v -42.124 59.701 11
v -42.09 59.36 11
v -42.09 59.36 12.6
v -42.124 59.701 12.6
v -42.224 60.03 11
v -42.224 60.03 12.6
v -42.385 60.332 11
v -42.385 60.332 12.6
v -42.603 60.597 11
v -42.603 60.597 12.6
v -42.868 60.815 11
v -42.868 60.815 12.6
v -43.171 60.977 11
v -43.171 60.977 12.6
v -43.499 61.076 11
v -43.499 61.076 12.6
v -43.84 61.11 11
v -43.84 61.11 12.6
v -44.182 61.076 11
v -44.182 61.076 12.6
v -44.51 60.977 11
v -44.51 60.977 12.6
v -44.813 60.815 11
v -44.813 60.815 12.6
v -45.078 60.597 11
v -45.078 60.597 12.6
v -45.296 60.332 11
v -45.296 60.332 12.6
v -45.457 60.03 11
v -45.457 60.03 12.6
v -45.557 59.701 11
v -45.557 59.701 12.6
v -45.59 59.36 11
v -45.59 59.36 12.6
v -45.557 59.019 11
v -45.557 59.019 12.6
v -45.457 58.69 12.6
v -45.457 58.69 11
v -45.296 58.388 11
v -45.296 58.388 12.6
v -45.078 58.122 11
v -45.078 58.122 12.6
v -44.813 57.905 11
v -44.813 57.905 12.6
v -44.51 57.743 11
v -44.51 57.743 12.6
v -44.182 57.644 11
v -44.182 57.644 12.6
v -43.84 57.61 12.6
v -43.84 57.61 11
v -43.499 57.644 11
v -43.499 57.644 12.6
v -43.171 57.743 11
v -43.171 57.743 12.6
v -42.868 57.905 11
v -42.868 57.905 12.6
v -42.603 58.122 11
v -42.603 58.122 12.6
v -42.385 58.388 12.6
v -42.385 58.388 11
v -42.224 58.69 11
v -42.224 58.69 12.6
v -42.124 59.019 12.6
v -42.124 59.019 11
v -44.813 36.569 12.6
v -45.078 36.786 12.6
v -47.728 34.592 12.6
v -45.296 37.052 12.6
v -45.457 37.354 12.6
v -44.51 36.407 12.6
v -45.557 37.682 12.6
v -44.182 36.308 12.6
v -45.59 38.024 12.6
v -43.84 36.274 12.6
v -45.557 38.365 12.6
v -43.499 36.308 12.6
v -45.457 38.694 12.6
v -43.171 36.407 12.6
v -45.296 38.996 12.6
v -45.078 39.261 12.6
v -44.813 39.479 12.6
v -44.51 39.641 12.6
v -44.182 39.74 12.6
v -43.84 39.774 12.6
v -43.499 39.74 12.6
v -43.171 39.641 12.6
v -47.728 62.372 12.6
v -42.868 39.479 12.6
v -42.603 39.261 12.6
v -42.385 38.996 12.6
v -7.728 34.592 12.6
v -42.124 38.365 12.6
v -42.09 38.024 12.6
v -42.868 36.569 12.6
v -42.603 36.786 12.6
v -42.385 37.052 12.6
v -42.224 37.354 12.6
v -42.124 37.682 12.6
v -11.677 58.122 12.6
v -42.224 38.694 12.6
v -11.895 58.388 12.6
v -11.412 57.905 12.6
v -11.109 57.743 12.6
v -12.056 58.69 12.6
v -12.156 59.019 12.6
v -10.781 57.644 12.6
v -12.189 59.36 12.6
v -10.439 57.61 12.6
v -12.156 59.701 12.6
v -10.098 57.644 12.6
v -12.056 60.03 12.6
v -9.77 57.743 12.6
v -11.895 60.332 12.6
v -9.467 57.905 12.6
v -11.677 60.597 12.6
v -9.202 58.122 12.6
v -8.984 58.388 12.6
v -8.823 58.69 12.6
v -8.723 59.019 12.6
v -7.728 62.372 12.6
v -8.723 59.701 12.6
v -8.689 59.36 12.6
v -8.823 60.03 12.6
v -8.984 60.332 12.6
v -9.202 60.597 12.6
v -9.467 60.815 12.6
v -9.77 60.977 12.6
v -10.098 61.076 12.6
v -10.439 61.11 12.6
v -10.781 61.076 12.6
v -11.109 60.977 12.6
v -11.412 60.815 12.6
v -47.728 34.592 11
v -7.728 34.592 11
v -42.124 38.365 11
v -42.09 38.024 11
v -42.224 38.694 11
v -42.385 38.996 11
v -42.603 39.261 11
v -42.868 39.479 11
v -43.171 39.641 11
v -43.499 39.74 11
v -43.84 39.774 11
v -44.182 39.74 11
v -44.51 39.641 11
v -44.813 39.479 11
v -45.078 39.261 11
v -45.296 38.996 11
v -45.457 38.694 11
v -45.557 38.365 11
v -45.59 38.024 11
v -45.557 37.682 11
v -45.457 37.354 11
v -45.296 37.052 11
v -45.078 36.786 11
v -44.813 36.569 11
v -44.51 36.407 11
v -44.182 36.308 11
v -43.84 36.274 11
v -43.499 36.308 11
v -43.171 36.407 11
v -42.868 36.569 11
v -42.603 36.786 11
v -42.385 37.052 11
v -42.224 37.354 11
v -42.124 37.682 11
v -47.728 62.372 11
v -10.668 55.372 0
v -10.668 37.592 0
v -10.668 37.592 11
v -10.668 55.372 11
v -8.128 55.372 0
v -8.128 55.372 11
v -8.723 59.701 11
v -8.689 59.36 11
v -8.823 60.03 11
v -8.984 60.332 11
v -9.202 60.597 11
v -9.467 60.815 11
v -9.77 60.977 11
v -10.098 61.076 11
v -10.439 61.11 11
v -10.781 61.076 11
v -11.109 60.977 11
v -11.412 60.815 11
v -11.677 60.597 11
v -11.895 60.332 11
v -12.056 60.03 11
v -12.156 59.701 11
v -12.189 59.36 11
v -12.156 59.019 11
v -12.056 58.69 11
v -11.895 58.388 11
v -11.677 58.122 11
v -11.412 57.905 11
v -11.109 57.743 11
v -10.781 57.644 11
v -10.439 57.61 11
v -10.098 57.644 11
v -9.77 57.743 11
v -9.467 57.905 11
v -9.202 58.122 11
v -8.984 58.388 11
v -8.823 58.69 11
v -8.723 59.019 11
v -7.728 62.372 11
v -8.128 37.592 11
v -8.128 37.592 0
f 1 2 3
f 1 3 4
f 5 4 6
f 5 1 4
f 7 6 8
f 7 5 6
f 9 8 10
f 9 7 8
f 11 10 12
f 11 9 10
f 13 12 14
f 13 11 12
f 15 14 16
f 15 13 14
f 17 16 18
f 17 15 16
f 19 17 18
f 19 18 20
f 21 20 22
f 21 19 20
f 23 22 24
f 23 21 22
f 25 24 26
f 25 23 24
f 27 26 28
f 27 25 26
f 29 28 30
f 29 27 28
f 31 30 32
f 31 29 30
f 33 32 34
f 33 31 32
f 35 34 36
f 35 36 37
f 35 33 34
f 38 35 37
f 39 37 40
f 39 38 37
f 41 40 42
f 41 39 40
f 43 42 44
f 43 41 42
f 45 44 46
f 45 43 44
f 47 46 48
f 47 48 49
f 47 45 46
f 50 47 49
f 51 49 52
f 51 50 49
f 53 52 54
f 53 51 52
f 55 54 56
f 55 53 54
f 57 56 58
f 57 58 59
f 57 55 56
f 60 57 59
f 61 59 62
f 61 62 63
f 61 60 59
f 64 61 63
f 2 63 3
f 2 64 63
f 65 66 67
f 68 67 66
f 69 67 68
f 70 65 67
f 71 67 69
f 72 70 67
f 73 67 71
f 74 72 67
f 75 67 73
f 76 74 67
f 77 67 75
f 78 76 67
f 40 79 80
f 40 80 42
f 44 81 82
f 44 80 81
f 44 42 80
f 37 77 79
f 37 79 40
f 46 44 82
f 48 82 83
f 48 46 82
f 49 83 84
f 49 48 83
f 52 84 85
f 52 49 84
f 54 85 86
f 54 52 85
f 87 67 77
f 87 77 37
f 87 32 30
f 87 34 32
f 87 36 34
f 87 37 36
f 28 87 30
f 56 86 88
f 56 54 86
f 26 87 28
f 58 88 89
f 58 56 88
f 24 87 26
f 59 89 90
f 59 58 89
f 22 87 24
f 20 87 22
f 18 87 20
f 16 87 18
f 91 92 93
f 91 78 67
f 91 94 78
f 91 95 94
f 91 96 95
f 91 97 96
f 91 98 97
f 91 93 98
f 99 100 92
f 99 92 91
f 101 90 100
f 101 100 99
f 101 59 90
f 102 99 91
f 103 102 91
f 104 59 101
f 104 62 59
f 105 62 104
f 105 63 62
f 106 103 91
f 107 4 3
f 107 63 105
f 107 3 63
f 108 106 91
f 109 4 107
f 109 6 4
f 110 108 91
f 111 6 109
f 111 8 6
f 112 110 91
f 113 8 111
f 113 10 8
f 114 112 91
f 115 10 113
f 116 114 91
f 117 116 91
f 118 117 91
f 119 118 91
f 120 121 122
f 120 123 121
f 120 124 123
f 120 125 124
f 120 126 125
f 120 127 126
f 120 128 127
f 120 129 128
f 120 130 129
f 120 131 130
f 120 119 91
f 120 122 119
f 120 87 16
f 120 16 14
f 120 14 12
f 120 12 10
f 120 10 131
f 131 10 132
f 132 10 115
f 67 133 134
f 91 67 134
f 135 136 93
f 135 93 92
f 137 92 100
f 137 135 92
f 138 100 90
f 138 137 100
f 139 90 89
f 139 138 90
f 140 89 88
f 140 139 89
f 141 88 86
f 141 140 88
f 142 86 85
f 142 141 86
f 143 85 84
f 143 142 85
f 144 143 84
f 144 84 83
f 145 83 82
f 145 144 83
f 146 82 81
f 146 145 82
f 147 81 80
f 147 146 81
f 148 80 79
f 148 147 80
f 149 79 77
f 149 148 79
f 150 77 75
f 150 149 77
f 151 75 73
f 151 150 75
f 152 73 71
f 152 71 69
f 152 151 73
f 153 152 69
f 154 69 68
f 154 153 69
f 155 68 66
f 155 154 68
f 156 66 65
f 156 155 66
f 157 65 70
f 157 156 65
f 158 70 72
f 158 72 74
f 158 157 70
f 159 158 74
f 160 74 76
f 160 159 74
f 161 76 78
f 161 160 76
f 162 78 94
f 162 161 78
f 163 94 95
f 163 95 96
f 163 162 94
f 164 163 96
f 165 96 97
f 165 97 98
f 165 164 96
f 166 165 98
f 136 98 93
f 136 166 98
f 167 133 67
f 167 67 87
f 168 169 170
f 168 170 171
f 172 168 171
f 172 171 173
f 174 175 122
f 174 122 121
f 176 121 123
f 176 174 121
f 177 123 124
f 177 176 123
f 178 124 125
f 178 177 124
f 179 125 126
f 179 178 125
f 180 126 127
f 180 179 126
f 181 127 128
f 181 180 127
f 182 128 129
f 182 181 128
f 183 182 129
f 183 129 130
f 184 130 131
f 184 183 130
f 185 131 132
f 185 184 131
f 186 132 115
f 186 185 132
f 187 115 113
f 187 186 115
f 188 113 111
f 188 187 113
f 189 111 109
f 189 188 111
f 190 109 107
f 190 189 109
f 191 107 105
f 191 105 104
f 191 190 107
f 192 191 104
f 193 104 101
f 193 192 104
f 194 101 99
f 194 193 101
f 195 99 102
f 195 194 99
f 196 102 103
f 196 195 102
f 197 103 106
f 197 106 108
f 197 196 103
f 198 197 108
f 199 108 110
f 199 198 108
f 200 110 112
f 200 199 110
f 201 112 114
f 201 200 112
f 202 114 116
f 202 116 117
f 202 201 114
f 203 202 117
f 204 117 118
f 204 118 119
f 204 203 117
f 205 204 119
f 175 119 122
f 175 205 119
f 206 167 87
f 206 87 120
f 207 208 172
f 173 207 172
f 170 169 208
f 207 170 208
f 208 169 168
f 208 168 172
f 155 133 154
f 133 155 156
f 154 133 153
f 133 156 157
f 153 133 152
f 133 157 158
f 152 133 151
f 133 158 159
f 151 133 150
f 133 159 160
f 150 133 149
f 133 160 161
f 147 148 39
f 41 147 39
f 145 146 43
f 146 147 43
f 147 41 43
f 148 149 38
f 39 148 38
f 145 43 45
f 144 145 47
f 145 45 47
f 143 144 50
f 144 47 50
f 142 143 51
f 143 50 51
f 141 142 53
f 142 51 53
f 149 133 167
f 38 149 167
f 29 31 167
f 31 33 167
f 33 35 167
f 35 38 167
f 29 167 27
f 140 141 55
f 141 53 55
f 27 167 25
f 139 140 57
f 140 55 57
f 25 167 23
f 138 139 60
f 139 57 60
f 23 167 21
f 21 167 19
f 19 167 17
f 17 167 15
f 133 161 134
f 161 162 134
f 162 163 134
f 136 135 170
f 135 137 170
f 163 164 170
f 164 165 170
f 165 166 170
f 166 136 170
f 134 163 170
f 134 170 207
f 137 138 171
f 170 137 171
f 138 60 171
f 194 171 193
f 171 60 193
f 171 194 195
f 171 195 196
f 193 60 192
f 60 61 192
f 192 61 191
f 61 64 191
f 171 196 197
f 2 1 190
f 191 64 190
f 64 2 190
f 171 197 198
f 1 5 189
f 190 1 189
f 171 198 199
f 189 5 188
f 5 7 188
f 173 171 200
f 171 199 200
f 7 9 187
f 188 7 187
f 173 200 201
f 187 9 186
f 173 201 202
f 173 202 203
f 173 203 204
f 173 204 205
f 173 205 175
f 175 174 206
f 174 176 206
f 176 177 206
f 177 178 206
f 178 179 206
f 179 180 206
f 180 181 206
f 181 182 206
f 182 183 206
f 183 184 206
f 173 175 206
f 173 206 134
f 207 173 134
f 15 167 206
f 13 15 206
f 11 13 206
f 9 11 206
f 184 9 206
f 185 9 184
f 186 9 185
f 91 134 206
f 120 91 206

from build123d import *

# Parameters (mm, degrees)
SKETCH_1_W      = 2.54
SKETCH_1_H      = 17.78
EXTRUDE_1_DEPTH = 11
SKETCH_2_W      = 40
SKETCH_2_H      = 27.78
SKETCH_2_R      = 1.7500127
SKETCH_2_R_2    = 1.75
EXTRUDE_2_DEPTH = 1.6


with BuildPart() as part:
    # 草图1 → 凸台-拉伸1 (new body)
    with BuildSketch(Plane.XY):
        with Locations((-9.398018796, 46.482082804)):
            Rectangle(SKETCH_1_W, SKETCH_1_H)
    extrude(amount=EXTRUDE_1_DEPTH)

    # 草图2 → 凸台-拉伸2 (add)
    with BuildSketch(Plane.XY.offset(11)):
        with Locations((-27.728018796, 48.482082804)):
            Rectangle(SKETCH_2_W, SKETCH_2_H)
        with Locations((-10.439420879, 59.35991872)):
            Circle(SKETCH_2_R, mode=Mode.SUBTRACT)
        with Locations((-43.840487681, 59.35991872)):
            Circle(SKETCH_2_R_2, mode=Mode.SUBTRACT)
        with Locations((-43.840487681, 38.023876048)):
            Circle(SKETCH_2_R_2, mode=Mode.SUBTRACT)
    extrude(amount=EXTRUDE_2_DEPTH)


solid = part.part
